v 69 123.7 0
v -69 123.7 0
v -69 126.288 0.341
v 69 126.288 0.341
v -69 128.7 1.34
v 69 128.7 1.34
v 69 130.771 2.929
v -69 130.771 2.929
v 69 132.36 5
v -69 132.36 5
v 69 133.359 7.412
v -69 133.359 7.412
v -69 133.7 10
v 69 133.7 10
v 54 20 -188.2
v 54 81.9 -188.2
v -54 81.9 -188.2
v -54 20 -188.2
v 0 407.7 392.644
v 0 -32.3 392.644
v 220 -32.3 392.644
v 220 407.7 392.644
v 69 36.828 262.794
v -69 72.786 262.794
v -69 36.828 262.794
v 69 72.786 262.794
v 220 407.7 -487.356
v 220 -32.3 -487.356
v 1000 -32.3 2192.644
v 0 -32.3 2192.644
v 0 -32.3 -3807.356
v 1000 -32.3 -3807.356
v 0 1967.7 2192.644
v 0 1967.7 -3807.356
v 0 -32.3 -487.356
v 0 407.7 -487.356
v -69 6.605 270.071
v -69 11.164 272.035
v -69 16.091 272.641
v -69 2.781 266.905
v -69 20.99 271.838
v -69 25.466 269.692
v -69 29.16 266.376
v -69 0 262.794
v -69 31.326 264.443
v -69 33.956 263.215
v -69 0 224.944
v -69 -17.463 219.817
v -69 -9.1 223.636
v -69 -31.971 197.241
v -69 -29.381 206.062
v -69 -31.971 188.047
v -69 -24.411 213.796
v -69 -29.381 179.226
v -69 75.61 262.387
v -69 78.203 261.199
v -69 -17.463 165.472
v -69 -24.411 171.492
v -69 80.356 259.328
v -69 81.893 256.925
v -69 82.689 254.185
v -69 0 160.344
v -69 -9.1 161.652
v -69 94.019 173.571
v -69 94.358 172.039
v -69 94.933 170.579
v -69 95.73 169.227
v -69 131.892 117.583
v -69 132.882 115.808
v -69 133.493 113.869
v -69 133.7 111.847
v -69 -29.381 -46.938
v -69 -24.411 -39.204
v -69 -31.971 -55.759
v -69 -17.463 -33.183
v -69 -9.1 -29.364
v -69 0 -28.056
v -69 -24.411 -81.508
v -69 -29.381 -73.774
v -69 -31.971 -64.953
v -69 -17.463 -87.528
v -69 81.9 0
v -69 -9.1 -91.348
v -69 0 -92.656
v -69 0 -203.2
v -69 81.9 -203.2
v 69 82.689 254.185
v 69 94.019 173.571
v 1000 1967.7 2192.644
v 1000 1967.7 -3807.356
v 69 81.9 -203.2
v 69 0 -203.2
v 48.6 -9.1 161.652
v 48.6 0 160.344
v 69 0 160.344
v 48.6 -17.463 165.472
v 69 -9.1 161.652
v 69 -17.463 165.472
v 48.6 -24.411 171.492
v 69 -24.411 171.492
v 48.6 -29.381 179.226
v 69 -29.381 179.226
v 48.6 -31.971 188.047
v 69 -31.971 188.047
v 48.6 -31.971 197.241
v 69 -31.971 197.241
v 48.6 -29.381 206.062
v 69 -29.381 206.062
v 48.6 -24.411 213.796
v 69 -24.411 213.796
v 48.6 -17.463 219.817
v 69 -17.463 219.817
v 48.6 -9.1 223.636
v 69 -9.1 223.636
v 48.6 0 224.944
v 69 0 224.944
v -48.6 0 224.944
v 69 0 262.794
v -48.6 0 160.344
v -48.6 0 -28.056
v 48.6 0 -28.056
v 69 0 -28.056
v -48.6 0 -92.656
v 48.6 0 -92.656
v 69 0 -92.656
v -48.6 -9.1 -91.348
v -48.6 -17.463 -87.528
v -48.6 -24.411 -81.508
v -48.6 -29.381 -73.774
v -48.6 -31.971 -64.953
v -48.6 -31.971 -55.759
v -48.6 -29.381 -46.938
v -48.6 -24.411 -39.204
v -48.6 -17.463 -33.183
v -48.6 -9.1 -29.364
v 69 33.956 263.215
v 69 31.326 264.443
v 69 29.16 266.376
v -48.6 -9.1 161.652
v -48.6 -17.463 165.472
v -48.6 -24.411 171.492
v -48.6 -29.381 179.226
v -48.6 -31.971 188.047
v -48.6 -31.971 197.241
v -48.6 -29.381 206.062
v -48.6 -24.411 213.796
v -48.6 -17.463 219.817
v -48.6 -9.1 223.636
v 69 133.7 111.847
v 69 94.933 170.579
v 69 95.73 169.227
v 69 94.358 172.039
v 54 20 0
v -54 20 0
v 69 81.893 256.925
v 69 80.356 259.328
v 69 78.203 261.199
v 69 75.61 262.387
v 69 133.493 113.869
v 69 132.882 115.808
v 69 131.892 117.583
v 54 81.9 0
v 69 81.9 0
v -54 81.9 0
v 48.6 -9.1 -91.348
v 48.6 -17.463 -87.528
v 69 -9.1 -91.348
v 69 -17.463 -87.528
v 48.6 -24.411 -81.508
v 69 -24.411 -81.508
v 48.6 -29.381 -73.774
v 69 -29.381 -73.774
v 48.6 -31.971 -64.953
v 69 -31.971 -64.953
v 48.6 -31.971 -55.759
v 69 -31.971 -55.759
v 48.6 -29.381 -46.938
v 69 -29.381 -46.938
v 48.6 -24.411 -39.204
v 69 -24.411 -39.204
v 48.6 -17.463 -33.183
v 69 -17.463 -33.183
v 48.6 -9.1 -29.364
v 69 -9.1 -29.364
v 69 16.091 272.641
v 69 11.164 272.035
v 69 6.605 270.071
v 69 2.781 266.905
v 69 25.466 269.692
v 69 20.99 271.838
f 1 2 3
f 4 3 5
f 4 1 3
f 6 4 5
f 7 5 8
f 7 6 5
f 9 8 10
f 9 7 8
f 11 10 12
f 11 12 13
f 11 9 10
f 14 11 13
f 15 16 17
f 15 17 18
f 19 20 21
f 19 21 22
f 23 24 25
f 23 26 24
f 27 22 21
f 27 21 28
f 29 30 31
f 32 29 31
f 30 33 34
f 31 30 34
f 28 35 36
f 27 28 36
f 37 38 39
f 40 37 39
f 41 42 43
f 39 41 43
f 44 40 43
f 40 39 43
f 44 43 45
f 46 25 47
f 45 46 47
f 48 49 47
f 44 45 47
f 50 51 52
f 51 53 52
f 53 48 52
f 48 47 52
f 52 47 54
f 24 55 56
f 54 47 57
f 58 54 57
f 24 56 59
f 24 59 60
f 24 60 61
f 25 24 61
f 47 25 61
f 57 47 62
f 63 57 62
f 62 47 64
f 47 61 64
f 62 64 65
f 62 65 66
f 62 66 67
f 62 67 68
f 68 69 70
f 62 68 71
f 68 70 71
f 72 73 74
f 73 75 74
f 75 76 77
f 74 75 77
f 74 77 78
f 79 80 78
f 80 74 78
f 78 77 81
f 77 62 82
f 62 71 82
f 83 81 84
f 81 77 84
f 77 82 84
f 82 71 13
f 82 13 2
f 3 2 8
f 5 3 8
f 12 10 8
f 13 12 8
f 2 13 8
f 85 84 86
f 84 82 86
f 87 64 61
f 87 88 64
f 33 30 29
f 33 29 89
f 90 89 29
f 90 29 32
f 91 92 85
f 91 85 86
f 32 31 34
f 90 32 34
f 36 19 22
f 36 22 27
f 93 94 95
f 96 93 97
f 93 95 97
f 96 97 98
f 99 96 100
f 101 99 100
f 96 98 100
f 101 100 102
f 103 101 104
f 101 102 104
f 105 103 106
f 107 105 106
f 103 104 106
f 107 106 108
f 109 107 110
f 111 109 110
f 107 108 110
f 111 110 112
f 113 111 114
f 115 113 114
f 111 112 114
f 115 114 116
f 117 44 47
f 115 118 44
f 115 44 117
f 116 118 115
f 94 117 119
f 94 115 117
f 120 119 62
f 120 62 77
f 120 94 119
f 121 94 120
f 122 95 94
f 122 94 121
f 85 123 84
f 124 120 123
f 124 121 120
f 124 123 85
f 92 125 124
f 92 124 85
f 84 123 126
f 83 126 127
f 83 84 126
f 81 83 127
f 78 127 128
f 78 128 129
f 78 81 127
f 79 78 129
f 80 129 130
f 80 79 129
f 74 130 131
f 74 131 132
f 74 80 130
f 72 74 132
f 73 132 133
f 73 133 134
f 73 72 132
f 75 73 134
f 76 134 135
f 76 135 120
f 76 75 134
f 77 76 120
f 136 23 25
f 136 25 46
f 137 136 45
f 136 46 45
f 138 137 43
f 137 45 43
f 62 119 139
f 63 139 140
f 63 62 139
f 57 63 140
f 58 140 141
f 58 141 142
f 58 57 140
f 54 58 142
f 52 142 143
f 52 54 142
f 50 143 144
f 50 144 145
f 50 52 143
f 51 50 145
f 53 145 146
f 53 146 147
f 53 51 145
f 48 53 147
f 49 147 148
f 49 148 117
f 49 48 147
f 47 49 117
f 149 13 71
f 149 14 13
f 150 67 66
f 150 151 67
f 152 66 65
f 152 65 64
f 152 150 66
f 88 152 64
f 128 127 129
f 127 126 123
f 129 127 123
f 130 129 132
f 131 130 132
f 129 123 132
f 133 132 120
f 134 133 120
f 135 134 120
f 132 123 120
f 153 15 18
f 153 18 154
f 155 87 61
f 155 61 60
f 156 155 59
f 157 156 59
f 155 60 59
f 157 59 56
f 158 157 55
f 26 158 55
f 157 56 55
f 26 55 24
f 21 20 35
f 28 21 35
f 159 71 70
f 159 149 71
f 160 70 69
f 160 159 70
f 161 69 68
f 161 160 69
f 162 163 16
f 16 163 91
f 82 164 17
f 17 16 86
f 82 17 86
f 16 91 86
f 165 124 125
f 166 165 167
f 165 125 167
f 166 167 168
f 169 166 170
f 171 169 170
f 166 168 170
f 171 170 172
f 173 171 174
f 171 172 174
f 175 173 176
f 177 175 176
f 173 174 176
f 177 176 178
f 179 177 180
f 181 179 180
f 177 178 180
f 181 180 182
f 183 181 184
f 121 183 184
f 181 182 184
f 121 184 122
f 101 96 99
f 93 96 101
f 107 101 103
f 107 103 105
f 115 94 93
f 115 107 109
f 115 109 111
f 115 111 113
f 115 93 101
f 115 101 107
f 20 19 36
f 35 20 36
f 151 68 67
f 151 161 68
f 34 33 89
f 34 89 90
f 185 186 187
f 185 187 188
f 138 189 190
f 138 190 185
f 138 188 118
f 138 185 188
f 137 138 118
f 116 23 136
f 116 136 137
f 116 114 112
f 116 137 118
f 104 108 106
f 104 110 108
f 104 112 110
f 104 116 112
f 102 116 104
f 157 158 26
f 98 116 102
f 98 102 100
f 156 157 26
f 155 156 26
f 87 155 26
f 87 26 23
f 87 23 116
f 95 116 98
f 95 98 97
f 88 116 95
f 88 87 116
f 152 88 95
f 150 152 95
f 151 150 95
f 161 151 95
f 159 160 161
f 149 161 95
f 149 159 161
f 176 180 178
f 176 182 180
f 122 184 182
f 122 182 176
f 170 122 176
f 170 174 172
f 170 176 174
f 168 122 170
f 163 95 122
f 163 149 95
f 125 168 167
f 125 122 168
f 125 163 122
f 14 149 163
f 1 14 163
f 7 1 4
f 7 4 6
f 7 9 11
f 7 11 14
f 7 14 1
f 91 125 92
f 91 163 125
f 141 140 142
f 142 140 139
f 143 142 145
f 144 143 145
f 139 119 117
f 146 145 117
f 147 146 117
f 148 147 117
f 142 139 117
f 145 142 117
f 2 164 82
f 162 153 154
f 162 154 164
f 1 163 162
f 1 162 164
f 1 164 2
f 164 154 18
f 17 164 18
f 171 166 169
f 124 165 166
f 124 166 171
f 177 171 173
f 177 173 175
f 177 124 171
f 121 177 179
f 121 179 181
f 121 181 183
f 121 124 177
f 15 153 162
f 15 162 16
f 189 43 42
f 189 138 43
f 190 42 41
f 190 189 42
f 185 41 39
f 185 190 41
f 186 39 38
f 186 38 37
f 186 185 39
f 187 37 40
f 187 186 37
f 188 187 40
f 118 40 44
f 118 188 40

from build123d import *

# Parameters (mm, degrees)
BOSS_EXTRUDE1_DEPTH = 69
SKETCH4_W           = 15
SKETCH4_H           = 188.2
BOSS_EXTRUDE2_DEPTH = 61.9
BOSS_EXTRUDE3_DEPTH = 20.4
FILLET1_R           = 10
SKETCH6_W           = 6000
SKETCH6_H           = 2000
BOSS_EXTRUDE4_DEPTH = 1000
SKETCH8_W           = 880
SKETCH8_H           = 440
BOSS_EXTRUDE5_DEPTH = 220


with BuildPart() as part:
    # Sketch2 → Boss-Extrude1 (new body, symmetric)
    with BuildSketch(Plane(origin=(0, 0, 0), x_dir=(0, 0, -1), z_dir=(1, 0, 0))):
        with BuildLine():
            Line((-262.793626597, 0), (0, 0))
            Line((0, 0), (203.2, 0))
            Line((203.2, 0), (203.2, 81.9))
            Line((203.2, 81.9), (188.2, 81.9))
            Line((188.2, 81.9), (188.2, 20))
            Line((188.2, 20), (0, 20))
            Line((0, 20), (0, 133.7))
            Line((0, 133.7), (-115, 133.7))
            Line((-115, 133.7), (-171.193830238, 94.352656466))
            Line((-171.193830238, 94.352656466), (-262.793626597, 81.479144628))
            Line((-262.793626597, 81.479144628), (-262.793626597, 31.479144628))
            ThreePointArc((-262.793626597, 31.479144628), (-272.644060375, 15.739572314), (-262.793626597, 0))
        make_face()
    extrude(amount=BOSS_EXTRUDE1_DEPTH, both=True)

    # Sketch4 → Boss-Extrude2 (add)
    with BuildSketch(Plane(origin=(0, 20, 0), x_dir=(1, 0, 0), z_dir=(0, 1, 0))):
        with Locations((61.5, 94.1)):
            Rectangle(SKETCH4_W, SKETCH4_H)
    boss_extrude2 = extrude(amount=BOSS_EXTRUDE2_DEPTH)

    # Mirror1: Boss-Extrude2 across plane
    add(boss_extrude2.mirror(Plane(origin=(0, 0, 0), x_dir=(0, 0, 1), z_dir=(1, 0, 0))))

    # Sketch5 → Boss-Extrude3 (add)
    with BuildSketch(Plane(origin=(69, 0, 0), x_dir=(0, 0, -1), z_dir=(1, 0, 0))):
        with BuildLine():
            Line((-224.944060375, 0), (-160.344060375, 0))
            ThreePointArc((-160.344060375, 0), (-192.644060375, -32.3), (-224.944060375, 0))
        make_face()
        with BuildLine():
            Line((28.055939625, 0), (92.655939625, 0))
            ThreePointArc((92.655939625, 0), (60.355939625, -32.3), (28.055939625, 0))
        make_face()
    boss_extrude3 = extrude(amount=-BOSS_EXTRUDE3_DEPTH)

    # Mirror2: Boss-Extrude3 across plane
    add(boss_extrude3.mirror(Plane(origin=(0, 0, 0), x_dir=(0, 0, 1), z_dir=(1, 0, 0))))

    # Fillet1
    fillet1_edges = [part.edges().sort_by_distance(p)[0] for p in [
        (0, 31.479144628, 262.793626597),
        (0, 81.479144628, 262.793626597),
        (0, 94.352656466, 171.193830238),
        (0, 133.7, 115),
        (0, 133.7, 0),
    ]]
    fillet(fillet1_edges, radius=FILLET1_R)


with BuildPart() as body_2:
    # Sketch6 → Boss-Extrude4 (new body)
    with BuildSketch(Plane(origin=(0, 0, 0), x_dir=(0, 0, -1), z_dir=(1, 0, 0))):
        with Locations((807.355939625, 967.7)):
            Rectangle(SKETCH6_W, SKETCH6_H)
    extrude(amount=BOSS_EXTRUDE4_DEPTH)


with BuildPart() as body_3:
    # Sketch8 → Boss-Extrude5 (new body)
    with BuildSketch(Plane(origin=(0, 0, 0), x_dir=(0, 0, -1), z_dir=(1, 0, 0))):
        with Locations((47.355939625, 187.7)):
            Rectangle(SKETCH8_W, SKETCH8_H)
    extrude(amount=BOSS_EXTRUDE5_DEPTH)


solid = Compound([part.part, body_2.part, body_3.part])
